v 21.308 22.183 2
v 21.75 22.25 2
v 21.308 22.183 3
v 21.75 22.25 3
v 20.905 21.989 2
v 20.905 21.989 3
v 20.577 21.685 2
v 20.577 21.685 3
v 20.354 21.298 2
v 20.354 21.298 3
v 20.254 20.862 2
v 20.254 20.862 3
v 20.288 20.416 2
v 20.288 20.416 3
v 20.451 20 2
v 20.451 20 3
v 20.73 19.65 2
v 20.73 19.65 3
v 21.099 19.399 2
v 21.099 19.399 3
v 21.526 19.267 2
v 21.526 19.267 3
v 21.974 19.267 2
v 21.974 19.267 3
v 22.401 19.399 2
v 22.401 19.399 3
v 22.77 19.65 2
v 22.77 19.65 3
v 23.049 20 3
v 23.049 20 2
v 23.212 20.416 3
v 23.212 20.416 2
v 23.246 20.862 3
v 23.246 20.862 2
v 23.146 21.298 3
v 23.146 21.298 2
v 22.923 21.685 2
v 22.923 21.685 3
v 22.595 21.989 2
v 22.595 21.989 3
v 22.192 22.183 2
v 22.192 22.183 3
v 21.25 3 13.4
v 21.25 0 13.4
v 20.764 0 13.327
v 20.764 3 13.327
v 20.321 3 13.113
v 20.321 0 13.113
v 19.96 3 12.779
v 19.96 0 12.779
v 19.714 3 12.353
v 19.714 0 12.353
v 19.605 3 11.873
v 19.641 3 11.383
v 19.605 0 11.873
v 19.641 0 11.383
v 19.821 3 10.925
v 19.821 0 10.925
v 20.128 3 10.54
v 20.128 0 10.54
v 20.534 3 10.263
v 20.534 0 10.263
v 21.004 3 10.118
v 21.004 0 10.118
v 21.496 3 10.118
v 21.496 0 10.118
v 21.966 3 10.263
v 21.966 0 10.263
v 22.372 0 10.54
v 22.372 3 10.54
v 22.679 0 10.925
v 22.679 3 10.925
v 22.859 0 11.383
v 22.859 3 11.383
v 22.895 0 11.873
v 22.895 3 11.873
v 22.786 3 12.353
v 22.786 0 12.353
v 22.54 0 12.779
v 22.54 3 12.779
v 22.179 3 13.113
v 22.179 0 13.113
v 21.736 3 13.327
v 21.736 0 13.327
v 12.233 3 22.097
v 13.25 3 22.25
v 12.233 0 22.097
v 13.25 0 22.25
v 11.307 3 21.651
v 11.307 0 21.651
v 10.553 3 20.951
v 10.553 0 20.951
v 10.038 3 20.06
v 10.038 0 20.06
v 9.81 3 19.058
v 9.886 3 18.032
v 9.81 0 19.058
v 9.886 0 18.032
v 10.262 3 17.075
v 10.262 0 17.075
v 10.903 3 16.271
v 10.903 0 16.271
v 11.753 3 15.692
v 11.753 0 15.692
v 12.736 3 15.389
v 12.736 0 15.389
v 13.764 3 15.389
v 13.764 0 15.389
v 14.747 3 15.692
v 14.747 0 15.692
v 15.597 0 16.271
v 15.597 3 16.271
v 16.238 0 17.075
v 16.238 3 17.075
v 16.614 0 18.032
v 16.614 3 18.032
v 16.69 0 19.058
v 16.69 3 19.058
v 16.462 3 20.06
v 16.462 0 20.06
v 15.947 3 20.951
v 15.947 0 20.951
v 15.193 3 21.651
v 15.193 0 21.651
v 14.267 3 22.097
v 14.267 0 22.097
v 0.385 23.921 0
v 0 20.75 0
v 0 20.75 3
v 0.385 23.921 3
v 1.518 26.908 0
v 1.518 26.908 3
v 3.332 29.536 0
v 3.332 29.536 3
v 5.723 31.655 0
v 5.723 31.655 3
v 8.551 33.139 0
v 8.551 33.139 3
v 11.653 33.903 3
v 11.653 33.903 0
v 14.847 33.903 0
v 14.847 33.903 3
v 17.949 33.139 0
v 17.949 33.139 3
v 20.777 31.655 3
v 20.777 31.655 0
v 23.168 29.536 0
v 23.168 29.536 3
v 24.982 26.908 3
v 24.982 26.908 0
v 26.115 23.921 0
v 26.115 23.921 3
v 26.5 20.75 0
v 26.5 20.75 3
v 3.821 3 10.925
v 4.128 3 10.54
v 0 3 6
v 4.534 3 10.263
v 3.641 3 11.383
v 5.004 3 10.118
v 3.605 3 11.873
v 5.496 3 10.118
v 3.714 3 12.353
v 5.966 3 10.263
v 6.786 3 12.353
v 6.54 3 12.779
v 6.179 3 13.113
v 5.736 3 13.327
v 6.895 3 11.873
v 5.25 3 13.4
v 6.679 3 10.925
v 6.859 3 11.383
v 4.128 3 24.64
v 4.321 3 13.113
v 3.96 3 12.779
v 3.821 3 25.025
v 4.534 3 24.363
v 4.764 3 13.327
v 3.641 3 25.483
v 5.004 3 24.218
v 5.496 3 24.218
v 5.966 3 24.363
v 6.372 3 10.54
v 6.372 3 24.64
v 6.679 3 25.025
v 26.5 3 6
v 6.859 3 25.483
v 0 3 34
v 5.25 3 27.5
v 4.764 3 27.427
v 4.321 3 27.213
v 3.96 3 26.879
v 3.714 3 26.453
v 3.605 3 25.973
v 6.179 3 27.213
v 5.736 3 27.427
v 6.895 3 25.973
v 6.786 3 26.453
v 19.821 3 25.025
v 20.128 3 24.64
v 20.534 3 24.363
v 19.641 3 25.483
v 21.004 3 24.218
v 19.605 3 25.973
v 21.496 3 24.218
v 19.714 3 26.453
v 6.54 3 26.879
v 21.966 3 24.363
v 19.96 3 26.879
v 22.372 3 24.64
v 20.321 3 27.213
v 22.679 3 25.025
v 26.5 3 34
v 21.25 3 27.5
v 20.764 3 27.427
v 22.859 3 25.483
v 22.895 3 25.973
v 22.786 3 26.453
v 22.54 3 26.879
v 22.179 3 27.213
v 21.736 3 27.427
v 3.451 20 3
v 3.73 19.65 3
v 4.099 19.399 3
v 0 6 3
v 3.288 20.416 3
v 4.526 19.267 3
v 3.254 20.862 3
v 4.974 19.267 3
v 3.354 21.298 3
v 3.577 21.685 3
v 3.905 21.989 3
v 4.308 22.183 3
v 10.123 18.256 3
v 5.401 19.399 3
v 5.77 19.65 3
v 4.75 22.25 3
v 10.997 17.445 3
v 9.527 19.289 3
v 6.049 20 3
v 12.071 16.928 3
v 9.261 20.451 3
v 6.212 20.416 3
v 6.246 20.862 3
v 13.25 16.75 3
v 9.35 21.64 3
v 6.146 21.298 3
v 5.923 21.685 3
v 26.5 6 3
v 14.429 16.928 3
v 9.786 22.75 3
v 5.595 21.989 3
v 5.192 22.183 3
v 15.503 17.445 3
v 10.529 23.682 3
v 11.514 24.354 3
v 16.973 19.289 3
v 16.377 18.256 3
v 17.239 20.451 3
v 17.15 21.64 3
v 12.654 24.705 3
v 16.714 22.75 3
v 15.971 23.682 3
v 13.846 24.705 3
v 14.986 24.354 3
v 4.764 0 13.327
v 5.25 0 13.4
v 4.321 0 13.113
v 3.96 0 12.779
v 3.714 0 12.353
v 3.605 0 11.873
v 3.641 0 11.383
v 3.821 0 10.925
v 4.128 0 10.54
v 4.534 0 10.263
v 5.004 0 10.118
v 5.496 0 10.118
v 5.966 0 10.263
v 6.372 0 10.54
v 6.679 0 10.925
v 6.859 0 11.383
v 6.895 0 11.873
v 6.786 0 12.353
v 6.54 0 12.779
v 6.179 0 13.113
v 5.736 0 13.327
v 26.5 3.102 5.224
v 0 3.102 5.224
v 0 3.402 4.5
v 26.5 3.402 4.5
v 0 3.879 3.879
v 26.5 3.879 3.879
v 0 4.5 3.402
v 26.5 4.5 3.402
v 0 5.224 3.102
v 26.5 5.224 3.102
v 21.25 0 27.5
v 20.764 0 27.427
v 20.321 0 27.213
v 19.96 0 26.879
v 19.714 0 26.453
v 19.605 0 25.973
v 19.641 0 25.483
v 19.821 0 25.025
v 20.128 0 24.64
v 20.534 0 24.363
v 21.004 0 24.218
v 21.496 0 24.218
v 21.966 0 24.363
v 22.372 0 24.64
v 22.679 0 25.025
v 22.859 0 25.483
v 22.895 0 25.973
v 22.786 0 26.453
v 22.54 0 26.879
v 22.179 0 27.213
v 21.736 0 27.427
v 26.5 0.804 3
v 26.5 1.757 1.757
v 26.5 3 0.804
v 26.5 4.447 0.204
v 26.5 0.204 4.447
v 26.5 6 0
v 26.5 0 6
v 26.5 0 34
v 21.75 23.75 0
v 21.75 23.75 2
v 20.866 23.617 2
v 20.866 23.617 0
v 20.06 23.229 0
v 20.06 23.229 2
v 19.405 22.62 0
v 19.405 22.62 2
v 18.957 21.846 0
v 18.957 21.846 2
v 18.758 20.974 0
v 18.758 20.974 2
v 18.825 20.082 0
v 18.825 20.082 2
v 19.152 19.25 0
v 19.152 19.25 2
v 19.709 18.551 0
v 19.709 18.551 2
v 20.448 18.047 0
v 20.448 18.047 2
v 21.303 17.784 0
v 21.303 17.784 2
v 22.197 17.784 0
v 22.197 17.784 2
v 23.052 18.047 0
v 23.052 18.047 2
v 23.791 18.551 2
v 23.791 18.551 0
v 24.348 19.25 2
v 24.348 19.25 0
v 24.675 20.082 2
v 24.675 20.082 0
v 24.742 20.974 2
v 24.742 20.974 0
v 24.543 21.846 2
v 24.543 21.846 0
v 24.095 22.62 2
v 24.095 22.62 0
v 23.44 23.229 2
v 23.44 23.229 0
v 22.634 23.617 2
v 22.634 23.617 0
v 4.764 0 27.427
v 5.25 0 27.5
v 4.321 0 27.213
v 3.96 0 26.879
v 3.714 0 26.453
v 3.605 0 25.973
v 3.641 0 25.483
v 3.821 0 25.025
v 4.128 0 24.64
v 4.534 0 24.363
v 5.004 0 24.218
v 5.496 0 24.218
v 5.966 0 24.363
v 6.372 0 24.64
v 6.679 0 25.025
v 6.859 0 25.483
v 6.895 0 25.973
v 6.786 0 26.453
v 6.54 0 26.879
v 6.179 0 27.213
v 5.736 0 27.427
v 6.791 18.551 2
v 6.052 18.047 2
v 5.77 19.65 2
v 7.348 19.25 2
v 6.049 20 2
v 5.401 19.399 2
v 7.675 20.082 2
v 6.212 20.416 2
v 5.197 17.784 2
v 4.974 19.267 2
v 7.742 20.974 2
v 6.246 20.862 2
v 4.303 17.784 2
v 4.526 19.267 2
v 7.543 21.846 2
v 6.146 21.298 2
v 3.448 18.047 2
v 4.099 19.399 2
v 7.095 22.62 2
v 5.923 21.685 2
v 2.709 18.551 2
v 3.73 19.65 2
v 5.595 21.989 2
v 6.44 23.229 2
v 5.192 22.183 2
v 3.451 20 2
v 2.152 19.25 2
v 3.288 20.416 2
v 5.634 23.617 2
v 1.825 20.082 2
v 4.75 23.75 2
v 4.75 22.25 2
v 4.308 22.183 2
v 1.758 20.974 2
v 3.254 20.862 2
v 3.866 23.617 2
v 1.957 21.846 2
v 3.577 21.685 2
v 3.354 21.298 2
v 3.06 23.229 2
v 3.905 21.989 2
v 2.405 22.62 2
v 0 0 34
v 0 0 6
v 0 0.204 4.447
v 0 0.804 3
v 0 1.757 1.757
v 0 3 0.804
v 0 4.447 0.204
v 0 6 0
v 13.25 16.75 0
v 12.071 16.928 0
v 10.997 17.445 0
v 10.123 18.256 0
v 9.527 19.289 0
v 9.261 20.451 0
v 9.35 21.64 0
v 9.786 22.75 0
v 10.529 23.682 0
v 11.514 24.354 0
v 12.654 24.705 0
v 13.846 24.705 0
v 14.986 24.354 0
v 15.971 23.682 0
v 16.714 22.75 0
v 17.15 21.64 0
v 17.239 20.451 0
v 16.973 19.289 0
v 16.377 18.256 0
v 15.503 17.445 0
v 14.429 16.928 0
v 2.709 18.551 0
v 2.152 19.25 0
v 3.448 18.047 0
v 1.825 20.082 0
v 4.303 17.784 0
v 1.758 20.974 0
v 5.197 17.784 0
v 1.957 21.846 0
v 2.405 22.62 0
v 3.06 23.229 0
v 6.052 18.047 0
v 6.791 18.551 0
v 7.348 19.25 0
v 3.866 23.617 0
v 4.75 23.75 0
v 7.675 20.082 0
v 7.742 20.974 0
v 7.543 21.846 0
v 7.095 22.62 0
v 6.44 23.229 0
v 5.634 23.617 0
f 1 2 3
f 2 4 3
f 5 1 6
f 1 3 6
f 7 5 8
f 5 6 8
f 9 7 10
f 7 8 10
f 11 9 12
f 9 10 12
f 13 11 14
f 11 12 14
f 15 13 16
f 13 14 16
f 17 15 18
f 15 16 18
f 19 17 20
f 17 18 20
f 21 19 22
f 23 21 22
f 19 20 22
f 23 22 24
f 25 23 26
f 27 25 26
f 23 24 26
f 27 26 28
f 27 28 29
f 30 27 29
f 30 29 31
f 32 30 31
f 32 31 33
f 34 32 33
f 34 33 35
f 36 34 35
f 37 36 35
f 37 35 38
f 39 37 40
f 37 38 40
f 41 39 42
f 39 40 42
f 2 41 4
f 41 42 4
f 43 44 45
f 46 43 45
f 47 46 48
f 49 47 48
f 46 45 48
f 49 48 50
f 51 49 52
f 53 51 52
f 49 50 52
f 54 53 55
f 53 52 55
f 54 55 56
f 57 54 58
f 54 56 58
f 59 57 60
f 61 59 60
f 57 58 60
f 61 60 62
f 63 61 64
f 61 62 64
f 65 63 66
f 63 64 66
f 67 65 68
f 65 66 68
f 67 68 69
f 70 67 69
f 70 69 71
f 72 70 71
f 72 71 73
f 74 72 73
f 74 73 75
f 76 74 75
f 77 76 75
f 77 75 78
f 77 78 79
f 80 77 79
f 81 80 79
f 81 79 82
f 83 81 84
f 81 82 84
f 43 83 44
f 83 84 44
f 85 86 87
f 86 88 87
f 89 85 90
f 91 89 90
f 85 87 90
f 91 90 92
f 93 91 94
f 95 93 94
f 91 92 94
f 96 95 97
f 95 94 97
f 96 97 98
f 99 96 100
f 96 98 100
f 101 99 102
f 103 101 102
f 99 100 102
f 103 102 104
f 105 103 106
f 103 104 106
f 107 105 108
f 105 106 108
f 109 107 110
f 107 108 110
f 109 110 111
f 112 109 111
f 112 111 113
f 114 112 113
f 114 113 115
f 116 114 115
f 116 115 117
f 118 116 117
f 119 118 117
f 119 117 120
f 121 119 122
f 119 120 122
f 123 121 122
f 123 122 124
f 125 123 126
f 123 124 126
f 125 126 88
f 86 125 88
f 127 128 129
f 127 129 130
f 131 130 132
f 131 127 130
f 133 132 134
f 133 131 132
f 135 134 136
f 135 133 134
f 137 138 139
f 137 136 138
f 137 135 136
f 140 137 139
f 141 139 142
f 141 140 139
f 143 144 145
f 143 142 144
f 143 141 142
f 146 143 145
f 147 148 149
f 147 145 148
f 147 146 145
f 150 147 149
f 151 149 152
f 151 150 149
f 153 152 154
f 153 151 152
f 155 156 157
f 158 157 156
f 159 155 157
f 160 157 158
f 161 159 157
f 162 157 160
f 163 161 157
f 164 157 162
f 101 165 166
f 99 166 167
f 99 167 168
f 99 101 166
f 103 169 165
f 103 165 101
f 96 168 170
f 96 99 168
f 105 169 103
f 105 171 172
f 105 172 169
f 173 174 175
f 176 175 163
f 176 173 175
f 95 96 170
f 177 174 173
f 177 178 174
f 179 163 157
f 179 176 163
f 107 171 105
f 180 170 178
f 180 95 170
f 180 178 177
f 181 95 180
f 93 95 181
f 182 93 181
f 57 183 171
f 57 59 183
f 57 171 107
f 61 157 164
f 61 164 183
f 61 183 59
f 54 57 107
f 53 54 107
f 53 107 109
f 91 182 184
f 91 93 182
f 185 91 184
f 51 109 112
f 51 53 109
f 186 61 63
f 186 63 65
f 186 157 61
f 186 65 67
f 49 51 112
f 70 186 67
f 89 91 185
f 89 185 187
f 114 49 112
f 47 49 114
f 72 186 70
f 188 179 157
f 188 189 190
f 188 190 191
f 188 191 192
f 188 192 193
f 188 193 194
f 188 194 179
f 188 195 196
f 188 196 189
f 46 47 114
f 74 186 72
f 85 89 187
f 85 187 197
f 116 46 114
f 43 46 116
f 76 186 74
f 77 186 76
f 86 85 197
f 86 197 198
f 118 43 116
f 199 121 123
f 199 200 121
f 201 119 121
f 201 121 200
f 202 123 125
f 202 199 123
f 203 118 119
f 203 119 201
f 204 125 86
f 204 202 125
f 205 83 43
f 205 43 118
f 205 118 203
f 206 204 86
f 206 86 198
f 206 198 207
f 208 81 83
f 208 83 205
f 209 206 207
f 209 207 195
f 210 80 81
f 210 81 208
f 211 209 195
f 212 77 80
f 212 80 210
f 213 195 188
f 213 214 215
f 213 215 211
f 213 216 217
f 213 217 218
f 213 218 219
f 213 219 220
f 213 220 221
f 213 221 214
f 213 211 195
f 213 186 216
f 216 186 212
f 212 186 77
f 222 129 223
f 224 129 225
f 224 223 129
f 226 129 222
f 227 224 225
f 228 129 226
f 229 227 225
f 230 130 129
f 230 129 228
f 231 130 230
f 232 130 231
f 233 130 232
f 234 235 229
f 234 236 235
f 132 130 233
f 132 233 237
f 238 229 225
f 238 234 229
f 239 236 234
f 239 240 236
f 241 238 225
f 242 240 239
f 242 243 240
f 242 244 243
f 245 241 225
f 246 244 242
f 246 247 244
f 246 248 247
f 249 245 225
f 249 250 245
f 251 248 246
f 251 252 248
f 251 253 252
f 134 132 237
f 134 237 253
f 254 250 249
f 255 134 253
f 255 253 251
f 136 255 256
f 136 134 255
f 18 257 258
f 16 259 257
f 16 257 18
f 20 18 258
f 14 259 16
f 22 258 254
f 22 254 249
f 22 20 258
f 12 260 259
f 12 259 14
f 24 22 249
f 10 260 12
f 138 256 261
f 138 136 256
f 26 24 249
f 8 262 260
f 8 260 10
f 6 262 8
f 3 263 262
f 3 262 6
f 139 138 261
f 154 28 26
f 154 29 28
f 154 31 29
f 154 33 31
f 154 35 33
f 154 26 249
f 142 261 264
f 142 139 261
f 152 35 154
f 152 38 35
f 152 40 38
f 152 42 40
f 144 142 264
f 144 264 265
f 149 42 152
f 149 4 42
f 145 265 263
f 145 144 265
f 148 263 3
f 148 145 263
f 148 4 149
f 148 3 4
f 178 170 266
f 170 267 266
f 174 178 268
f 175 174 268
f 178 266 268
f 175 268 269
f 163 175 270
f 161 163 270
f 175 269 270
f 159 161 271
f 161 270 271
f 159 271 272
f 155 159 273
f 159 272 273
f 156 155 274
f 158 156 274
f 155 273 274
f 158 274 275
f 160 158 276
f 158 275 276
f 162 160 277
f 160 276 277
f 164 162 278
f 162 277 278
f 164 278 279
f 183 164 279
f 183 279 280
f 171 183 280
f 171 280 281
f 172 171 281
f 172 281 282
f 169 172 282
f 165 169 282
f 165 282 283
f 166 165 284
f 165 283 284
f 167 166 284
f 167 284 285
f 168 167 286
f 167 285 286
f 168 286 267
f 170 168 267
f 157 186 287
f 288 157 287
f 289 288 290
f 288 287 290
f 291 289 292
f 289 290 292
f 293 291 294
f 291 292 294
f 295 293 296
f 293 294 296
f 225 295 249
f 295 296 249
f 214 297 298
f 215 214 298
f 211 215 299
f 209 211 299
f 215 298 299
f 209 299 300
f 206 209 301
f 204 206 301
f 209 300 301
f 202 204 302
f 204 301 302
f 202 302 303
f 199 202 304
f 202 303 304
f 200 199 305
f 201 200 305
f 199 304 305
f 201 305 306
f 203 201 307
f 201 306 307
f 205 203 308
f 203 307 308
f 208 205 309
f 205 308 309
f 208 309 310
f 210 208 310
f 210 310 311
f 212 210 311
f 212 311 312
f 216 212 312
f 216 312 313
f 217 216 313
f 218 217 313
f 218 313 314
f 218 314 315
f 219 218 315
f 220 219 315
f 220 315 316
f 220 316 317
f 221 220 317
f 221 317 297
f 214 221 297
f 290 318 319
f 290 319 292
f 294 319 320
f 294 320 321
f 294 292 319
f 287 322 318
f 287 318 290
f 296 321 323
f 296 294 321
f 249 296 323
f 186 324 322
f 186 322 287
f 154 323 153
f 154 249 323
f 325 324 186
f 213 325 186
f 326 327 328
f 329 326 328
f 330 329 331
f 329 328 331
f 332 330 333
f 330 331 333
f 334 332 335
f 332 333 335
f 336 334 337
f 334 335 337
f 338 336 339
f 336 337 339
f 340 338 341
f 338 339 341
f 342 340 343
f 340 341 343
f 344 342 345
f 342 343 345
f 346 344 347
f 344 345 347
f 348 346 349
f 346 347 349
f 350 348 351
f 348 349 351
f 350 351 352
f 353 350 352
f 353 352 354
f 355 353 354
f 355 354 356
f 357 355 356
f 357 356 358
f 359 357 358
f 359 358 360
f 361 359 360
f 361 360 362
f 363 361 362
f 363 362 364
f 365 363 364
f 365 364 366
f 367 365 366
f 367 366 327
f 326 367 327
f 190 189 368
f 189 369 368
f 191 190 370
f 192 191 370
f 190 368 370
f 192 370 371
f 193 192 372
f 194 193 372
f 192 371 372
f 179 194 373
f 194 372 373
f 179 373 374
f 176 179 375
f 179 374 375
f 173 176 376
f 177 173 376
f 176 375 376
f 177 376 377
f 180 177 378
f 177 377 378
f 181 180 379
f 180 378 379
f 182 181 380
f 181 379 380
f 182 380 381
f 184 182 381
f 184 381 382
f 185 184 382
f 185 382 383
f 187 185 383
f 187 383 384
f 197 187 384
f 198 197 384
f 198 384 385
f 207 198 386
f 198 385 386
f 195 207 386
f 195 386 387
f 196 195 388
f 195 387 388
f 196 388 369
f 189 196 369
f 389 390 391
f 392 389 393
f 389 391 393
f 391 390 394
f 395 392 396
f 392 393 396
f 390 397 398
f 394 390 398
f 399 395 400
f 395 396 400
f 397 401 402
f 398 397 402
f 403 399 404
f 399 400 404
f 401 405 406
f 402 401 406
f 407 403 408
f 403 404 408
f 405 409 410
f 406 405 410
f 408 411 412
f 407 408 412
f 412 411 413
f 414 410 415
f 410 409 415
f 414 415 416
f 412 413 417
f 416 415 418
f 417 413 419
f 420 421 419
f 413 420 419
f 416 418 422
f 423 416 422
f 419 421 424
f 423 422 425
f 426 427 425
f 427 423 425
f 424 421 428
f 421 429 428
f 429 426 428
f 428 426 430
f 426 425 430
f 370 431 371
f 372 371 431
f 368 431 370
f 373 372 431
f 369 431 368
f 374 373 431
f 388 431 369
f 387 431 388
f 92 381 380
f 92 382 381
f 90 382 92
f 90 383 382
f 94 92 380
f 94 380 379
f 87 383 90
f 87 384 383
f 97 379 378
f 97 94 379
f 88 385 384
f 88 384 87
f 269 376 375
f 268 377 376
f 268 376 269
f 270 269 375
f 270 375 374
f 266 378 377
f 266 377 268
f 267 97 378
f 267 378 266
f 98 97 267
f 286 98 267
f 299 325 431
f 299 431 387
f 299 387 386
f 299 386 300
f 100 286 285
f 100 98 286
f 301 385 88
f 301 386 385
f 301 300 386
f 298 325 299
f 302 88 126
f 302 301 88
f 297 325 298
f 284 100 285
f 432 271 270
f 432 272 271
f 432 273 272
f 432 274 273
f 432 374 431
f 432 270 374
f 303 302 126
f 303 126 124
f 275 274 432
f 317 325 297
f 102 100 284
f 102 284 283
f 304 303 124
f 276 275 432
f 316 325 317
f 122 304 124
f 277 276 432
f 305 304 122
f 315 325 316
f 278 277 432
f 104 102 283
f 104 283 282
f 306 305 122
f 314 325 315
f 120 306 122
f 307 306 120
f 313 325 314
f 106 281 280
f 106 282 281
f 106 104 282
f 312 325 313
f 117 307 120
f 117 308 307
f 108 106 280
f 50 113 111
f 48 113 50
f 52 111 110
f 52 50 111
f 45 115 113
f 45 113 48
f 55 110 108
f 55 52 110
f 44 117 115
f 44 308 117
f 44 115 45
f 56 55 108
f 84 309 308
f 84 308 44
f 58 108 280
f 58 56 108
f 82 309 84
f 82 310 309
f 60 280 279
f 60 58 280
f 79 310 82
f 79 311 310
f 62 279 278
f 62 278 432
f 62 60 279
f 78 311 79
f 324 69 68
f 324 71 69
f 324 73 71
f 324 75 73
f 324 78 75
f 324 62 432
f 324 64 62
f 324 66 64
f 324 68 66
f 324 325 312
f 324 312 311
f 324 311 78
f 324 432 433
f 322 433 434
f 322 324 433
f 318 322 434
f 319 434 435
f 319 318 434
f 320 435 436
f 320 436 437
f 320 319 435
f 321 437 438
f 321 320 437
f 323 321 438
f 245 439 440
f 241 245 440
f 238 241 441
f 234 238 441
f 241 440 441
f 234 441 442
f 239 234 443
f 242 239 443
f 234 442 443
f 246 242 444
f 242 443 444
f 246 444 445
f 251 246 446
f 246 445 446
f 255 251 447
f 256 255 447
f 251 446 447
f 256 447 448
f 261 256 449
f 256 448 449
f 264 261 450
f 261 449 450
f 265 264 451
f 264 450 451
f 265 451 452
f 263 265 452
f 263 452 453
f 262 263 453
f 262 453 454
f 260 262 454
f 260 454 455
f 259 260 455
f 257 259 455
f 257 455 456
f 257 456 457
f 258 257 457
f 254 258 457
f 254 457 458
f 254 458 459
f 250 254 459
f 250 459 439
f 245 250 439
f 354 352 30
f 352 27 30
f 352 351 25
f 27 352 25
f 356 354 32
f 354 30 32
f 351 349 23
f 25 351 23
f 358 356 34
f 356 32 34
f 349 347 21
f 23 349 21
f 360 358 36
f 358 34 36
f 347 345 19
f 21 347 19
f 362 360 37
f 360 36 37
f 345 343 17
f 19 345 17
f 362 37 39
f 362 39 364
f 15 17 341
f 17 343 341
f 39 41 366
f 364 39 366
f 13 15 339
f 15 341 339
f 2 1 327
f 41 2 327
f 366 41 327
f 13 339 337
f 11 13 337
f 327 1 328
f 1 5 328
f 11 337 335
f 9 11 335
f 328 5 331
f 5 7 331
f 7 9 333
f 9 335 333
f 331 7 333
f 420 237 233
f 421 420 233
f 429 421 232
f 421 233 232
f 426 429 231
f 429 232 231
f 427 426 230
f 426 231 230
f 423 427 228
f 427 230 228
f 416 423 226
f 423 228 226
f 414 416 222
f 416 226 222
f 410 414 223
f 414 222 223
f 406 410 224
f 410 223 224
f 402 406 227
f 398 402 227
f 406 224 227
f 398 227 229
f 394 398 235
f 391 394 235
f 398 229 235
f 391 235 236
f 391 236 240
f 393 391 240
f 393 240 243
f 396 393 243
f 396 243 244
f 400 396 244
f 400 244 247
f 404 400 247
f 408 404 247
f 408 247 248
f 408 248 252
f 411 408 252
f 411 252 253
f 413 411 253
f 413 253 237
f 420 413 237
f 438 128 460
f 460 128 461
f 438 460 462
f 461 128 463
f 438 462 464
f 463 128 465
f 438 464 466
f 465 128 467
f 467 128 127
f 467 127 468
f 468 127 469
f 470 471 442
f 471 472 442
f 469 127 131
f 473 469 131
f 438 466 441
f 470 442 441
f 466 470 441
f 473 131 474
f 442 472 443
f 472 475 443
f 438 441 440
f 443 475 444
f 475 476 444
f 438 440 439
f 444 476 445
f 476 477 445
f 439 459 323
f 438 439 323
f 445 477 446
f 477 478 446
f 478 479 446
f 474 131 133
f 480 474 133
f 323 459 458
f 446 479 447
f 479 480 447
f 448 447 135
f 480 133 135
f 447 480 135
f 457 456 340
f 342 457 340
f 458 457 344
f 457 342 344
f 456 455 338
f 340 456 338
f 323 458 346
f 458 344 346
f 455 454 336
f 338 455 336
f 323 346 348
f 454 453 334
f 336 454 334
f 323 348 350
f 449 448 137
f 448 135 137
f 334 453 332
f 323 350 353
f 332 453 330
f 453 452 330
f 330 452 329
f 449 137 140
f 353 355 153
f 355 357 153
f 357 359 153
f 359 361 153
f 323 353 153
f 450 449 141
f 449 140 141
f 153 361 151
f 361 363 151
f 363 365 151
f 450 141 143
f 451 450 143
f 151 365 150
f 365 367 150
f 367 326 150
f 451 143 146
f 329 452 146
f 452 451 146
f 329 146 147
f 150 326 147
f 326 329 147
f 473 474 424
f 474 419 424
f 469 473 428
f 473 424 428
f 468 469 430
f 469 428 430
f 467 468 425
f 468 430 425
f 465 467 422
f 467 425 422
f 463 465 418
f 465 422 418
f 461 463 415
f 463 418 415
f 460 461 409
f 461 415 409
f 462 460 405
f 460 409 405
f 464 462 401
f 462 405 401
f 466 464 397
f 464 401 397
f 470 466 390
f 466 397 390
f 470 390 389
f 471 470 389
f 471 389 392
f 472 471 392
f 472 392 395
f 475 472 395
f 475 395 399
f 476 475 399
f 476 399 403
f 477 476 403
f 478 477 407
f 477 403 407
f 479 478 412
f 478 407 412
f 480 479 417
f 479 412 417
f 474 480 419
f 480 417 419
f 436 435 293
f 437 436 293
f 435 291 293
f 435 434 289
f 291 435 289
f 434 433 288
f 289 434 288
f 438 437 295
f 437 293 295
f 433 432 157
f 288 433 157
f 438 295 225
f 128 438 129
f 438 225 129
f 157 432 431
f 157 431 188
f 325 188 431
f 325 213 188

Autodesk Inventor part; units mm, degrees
ref_plane "YZ Plane" through (0, 0, 0) normal (1, 0, 0) x (0, 1, 0)
ref_plane "XZ Plane" through (0, 0, 0) normal (0, 1, 0) x (-1, 0, 0)
ref_plane "XY Plane" through (0, 0, 0) normal (0, 0, 1) x (1, 0, 0)
sketch "Sketch4" plane through (0, 0, 0) normal (0, 0, 1) x (1, 0, 0)
  line L0 (0, 0) -> (26.5, 0)
  line L1 (26.5, 0) -> (26.5, 20.75)
  line L2 (0, 20.75) -> (0, 0)
  arc A0 (26.5, 20.75) -> (0, 20.75) centre (13.25, 20.75) ccw
  line L3 (-1.1061, 34) -> (25.3939, 34) construction
  dimension "d70" = 26.5
  dimension "d71" = 34
extrude "Plate3" add sketch "Sketch4" along normal blind 3
sketch "Sketch5" plane through (26.5, 3, 0) normal (0, -1, 0) x (1, 0, 0)
  line L0 (-26.5, 0) -> (0, 0)
  line L1 (0, 0) -> (0, 34)
  line L2 (0, 34) -> (-26.5, 34)
  line L3 (-26.5, 34) -> (-26.5, 0)
edge flange "Flange2" height 34 angle 90 thickness 3 bend radius 3 thickness toward (0, -1, 0) relief tear relief width 3 relief depth 1.5 edges at (13.25, 0, 3) wall of the first edge with corners at (0, 3, 0) (26.5, 3, 0) (26.5, 3, 34) (0, 3, 34)
bend "Bend2"
corner "Corner2"
sketch "Sketch8" plane through (0, 3, 3) normal (0, 0, 1) x (1, 0, 0)
  line L0 (26.5, 3) -> (0, 3) projected
  line L1 (13.25, 3) -> (13.25, 35.5458) construction
  line L2 (0, -3) -> (26.5, -3) projected
  point P0 (13.25, 17.75)
  point P1 (13.25, -3)
  dimension "d72" = 20.75
hole "Hole3" at (13.25, 20.75, 3) direction (0, 0, -1) diameter 8 end through all
sketch "Sketch11" plane through (0, 3, 34) normal (0, 1, 0) x (1, 0, 0)
  line L0 (0, 0) -> (26.5, 0) projected
  line L1 (13.25, 0) -> (13.25, 41.3955) construction
  point P0 (0, 34)
  point P1 (13.25, 15.2)
  dimension "d81" = 15.2
hole "Hole5" at (13.25, 3, 18.8) direction (0, -1, 0) diameter 6.9 end through all
sketch "Sketch12" plane through (0, 3, 34) normal (0, 1, 0) x (1, 0, 0)
  circle A0 centre (13.25, 15.2) radius 3.45 projected
  circle A1 centre (13.25, 15.2) radius 10.6631 construction
  line L0 (0, 0) -> (26.5, 0) projected
  point P0 (0, 34)
  point P1 (21.25, 8.15)
  point P2 (5.25, 8.15)
  point P3 (5.25, 22.25)
  point P4 (21.25, 22.25)
  dimension "d89" = 16
  dimension "d90" = 8.15
hole "Hole6" at (21.25, 3, 25.85) at (5.25, 3, 25.85) at (5.25, 3, 11.75) at (21.25, 3, 11.75) direction (0, -1, 0) diameter 3.3 end through all
sketch "Sketch13" plane through (0, 0, 0) normal (0, 0, -1) x (-1, 0, 0)
  circle A0 centre (-13.25, 20.75) radius 4 projected
  circle A1 centre (-13.25, 20.75) radius 8.5 construction
  point P0 (0, 0)
  point P1 (-21.75, 20.75)
  point P2 (-4.75, 20.75)
  dimension "d98" = 17
hole "Hole7" at (21.75, 20.75, 0) at (4.75, 20.75, 0) direction (0, 0, 1) diameter 3 end through all counterbore diameter 6 counterbore depth 2
equation "\"d27\" = Thickness"
equation "\"d28\" = BendReliefWidth"
equation "\"d29\" = BendReliefDepth"
equation "\"d30\" = MinimumRemnant"
equation "\"d31\" = TransitionRadius"
equation "\"d34\" = BendRadius"
equation "\"d35\" = CornerReliefSize"
equation "\"d36\" = GapSize"
equation "\"d37\" = JacobiRadiusSize"
equation "\"BendRadius\" = Thickness"
equation "\"BendReliefWidth\" = Thickness"
equation "\"BendReliefDepth\" = 0.5 * Thickness"
equation "\"CornerReliefSize\" = 4 * Thickness"
equation "\"MinimumRemnant\" = 2 * Thickness"
equation "\"TransitionRadius\" = BendRadius"
equation "\"JacobiRadiusSize\" = BendRadius"
equation "\"GapSize\" = Thickness"
equation "\"Thickness\" = 3"
properties part number "JGA25-370-bracket" material "Aluminum 6061"
